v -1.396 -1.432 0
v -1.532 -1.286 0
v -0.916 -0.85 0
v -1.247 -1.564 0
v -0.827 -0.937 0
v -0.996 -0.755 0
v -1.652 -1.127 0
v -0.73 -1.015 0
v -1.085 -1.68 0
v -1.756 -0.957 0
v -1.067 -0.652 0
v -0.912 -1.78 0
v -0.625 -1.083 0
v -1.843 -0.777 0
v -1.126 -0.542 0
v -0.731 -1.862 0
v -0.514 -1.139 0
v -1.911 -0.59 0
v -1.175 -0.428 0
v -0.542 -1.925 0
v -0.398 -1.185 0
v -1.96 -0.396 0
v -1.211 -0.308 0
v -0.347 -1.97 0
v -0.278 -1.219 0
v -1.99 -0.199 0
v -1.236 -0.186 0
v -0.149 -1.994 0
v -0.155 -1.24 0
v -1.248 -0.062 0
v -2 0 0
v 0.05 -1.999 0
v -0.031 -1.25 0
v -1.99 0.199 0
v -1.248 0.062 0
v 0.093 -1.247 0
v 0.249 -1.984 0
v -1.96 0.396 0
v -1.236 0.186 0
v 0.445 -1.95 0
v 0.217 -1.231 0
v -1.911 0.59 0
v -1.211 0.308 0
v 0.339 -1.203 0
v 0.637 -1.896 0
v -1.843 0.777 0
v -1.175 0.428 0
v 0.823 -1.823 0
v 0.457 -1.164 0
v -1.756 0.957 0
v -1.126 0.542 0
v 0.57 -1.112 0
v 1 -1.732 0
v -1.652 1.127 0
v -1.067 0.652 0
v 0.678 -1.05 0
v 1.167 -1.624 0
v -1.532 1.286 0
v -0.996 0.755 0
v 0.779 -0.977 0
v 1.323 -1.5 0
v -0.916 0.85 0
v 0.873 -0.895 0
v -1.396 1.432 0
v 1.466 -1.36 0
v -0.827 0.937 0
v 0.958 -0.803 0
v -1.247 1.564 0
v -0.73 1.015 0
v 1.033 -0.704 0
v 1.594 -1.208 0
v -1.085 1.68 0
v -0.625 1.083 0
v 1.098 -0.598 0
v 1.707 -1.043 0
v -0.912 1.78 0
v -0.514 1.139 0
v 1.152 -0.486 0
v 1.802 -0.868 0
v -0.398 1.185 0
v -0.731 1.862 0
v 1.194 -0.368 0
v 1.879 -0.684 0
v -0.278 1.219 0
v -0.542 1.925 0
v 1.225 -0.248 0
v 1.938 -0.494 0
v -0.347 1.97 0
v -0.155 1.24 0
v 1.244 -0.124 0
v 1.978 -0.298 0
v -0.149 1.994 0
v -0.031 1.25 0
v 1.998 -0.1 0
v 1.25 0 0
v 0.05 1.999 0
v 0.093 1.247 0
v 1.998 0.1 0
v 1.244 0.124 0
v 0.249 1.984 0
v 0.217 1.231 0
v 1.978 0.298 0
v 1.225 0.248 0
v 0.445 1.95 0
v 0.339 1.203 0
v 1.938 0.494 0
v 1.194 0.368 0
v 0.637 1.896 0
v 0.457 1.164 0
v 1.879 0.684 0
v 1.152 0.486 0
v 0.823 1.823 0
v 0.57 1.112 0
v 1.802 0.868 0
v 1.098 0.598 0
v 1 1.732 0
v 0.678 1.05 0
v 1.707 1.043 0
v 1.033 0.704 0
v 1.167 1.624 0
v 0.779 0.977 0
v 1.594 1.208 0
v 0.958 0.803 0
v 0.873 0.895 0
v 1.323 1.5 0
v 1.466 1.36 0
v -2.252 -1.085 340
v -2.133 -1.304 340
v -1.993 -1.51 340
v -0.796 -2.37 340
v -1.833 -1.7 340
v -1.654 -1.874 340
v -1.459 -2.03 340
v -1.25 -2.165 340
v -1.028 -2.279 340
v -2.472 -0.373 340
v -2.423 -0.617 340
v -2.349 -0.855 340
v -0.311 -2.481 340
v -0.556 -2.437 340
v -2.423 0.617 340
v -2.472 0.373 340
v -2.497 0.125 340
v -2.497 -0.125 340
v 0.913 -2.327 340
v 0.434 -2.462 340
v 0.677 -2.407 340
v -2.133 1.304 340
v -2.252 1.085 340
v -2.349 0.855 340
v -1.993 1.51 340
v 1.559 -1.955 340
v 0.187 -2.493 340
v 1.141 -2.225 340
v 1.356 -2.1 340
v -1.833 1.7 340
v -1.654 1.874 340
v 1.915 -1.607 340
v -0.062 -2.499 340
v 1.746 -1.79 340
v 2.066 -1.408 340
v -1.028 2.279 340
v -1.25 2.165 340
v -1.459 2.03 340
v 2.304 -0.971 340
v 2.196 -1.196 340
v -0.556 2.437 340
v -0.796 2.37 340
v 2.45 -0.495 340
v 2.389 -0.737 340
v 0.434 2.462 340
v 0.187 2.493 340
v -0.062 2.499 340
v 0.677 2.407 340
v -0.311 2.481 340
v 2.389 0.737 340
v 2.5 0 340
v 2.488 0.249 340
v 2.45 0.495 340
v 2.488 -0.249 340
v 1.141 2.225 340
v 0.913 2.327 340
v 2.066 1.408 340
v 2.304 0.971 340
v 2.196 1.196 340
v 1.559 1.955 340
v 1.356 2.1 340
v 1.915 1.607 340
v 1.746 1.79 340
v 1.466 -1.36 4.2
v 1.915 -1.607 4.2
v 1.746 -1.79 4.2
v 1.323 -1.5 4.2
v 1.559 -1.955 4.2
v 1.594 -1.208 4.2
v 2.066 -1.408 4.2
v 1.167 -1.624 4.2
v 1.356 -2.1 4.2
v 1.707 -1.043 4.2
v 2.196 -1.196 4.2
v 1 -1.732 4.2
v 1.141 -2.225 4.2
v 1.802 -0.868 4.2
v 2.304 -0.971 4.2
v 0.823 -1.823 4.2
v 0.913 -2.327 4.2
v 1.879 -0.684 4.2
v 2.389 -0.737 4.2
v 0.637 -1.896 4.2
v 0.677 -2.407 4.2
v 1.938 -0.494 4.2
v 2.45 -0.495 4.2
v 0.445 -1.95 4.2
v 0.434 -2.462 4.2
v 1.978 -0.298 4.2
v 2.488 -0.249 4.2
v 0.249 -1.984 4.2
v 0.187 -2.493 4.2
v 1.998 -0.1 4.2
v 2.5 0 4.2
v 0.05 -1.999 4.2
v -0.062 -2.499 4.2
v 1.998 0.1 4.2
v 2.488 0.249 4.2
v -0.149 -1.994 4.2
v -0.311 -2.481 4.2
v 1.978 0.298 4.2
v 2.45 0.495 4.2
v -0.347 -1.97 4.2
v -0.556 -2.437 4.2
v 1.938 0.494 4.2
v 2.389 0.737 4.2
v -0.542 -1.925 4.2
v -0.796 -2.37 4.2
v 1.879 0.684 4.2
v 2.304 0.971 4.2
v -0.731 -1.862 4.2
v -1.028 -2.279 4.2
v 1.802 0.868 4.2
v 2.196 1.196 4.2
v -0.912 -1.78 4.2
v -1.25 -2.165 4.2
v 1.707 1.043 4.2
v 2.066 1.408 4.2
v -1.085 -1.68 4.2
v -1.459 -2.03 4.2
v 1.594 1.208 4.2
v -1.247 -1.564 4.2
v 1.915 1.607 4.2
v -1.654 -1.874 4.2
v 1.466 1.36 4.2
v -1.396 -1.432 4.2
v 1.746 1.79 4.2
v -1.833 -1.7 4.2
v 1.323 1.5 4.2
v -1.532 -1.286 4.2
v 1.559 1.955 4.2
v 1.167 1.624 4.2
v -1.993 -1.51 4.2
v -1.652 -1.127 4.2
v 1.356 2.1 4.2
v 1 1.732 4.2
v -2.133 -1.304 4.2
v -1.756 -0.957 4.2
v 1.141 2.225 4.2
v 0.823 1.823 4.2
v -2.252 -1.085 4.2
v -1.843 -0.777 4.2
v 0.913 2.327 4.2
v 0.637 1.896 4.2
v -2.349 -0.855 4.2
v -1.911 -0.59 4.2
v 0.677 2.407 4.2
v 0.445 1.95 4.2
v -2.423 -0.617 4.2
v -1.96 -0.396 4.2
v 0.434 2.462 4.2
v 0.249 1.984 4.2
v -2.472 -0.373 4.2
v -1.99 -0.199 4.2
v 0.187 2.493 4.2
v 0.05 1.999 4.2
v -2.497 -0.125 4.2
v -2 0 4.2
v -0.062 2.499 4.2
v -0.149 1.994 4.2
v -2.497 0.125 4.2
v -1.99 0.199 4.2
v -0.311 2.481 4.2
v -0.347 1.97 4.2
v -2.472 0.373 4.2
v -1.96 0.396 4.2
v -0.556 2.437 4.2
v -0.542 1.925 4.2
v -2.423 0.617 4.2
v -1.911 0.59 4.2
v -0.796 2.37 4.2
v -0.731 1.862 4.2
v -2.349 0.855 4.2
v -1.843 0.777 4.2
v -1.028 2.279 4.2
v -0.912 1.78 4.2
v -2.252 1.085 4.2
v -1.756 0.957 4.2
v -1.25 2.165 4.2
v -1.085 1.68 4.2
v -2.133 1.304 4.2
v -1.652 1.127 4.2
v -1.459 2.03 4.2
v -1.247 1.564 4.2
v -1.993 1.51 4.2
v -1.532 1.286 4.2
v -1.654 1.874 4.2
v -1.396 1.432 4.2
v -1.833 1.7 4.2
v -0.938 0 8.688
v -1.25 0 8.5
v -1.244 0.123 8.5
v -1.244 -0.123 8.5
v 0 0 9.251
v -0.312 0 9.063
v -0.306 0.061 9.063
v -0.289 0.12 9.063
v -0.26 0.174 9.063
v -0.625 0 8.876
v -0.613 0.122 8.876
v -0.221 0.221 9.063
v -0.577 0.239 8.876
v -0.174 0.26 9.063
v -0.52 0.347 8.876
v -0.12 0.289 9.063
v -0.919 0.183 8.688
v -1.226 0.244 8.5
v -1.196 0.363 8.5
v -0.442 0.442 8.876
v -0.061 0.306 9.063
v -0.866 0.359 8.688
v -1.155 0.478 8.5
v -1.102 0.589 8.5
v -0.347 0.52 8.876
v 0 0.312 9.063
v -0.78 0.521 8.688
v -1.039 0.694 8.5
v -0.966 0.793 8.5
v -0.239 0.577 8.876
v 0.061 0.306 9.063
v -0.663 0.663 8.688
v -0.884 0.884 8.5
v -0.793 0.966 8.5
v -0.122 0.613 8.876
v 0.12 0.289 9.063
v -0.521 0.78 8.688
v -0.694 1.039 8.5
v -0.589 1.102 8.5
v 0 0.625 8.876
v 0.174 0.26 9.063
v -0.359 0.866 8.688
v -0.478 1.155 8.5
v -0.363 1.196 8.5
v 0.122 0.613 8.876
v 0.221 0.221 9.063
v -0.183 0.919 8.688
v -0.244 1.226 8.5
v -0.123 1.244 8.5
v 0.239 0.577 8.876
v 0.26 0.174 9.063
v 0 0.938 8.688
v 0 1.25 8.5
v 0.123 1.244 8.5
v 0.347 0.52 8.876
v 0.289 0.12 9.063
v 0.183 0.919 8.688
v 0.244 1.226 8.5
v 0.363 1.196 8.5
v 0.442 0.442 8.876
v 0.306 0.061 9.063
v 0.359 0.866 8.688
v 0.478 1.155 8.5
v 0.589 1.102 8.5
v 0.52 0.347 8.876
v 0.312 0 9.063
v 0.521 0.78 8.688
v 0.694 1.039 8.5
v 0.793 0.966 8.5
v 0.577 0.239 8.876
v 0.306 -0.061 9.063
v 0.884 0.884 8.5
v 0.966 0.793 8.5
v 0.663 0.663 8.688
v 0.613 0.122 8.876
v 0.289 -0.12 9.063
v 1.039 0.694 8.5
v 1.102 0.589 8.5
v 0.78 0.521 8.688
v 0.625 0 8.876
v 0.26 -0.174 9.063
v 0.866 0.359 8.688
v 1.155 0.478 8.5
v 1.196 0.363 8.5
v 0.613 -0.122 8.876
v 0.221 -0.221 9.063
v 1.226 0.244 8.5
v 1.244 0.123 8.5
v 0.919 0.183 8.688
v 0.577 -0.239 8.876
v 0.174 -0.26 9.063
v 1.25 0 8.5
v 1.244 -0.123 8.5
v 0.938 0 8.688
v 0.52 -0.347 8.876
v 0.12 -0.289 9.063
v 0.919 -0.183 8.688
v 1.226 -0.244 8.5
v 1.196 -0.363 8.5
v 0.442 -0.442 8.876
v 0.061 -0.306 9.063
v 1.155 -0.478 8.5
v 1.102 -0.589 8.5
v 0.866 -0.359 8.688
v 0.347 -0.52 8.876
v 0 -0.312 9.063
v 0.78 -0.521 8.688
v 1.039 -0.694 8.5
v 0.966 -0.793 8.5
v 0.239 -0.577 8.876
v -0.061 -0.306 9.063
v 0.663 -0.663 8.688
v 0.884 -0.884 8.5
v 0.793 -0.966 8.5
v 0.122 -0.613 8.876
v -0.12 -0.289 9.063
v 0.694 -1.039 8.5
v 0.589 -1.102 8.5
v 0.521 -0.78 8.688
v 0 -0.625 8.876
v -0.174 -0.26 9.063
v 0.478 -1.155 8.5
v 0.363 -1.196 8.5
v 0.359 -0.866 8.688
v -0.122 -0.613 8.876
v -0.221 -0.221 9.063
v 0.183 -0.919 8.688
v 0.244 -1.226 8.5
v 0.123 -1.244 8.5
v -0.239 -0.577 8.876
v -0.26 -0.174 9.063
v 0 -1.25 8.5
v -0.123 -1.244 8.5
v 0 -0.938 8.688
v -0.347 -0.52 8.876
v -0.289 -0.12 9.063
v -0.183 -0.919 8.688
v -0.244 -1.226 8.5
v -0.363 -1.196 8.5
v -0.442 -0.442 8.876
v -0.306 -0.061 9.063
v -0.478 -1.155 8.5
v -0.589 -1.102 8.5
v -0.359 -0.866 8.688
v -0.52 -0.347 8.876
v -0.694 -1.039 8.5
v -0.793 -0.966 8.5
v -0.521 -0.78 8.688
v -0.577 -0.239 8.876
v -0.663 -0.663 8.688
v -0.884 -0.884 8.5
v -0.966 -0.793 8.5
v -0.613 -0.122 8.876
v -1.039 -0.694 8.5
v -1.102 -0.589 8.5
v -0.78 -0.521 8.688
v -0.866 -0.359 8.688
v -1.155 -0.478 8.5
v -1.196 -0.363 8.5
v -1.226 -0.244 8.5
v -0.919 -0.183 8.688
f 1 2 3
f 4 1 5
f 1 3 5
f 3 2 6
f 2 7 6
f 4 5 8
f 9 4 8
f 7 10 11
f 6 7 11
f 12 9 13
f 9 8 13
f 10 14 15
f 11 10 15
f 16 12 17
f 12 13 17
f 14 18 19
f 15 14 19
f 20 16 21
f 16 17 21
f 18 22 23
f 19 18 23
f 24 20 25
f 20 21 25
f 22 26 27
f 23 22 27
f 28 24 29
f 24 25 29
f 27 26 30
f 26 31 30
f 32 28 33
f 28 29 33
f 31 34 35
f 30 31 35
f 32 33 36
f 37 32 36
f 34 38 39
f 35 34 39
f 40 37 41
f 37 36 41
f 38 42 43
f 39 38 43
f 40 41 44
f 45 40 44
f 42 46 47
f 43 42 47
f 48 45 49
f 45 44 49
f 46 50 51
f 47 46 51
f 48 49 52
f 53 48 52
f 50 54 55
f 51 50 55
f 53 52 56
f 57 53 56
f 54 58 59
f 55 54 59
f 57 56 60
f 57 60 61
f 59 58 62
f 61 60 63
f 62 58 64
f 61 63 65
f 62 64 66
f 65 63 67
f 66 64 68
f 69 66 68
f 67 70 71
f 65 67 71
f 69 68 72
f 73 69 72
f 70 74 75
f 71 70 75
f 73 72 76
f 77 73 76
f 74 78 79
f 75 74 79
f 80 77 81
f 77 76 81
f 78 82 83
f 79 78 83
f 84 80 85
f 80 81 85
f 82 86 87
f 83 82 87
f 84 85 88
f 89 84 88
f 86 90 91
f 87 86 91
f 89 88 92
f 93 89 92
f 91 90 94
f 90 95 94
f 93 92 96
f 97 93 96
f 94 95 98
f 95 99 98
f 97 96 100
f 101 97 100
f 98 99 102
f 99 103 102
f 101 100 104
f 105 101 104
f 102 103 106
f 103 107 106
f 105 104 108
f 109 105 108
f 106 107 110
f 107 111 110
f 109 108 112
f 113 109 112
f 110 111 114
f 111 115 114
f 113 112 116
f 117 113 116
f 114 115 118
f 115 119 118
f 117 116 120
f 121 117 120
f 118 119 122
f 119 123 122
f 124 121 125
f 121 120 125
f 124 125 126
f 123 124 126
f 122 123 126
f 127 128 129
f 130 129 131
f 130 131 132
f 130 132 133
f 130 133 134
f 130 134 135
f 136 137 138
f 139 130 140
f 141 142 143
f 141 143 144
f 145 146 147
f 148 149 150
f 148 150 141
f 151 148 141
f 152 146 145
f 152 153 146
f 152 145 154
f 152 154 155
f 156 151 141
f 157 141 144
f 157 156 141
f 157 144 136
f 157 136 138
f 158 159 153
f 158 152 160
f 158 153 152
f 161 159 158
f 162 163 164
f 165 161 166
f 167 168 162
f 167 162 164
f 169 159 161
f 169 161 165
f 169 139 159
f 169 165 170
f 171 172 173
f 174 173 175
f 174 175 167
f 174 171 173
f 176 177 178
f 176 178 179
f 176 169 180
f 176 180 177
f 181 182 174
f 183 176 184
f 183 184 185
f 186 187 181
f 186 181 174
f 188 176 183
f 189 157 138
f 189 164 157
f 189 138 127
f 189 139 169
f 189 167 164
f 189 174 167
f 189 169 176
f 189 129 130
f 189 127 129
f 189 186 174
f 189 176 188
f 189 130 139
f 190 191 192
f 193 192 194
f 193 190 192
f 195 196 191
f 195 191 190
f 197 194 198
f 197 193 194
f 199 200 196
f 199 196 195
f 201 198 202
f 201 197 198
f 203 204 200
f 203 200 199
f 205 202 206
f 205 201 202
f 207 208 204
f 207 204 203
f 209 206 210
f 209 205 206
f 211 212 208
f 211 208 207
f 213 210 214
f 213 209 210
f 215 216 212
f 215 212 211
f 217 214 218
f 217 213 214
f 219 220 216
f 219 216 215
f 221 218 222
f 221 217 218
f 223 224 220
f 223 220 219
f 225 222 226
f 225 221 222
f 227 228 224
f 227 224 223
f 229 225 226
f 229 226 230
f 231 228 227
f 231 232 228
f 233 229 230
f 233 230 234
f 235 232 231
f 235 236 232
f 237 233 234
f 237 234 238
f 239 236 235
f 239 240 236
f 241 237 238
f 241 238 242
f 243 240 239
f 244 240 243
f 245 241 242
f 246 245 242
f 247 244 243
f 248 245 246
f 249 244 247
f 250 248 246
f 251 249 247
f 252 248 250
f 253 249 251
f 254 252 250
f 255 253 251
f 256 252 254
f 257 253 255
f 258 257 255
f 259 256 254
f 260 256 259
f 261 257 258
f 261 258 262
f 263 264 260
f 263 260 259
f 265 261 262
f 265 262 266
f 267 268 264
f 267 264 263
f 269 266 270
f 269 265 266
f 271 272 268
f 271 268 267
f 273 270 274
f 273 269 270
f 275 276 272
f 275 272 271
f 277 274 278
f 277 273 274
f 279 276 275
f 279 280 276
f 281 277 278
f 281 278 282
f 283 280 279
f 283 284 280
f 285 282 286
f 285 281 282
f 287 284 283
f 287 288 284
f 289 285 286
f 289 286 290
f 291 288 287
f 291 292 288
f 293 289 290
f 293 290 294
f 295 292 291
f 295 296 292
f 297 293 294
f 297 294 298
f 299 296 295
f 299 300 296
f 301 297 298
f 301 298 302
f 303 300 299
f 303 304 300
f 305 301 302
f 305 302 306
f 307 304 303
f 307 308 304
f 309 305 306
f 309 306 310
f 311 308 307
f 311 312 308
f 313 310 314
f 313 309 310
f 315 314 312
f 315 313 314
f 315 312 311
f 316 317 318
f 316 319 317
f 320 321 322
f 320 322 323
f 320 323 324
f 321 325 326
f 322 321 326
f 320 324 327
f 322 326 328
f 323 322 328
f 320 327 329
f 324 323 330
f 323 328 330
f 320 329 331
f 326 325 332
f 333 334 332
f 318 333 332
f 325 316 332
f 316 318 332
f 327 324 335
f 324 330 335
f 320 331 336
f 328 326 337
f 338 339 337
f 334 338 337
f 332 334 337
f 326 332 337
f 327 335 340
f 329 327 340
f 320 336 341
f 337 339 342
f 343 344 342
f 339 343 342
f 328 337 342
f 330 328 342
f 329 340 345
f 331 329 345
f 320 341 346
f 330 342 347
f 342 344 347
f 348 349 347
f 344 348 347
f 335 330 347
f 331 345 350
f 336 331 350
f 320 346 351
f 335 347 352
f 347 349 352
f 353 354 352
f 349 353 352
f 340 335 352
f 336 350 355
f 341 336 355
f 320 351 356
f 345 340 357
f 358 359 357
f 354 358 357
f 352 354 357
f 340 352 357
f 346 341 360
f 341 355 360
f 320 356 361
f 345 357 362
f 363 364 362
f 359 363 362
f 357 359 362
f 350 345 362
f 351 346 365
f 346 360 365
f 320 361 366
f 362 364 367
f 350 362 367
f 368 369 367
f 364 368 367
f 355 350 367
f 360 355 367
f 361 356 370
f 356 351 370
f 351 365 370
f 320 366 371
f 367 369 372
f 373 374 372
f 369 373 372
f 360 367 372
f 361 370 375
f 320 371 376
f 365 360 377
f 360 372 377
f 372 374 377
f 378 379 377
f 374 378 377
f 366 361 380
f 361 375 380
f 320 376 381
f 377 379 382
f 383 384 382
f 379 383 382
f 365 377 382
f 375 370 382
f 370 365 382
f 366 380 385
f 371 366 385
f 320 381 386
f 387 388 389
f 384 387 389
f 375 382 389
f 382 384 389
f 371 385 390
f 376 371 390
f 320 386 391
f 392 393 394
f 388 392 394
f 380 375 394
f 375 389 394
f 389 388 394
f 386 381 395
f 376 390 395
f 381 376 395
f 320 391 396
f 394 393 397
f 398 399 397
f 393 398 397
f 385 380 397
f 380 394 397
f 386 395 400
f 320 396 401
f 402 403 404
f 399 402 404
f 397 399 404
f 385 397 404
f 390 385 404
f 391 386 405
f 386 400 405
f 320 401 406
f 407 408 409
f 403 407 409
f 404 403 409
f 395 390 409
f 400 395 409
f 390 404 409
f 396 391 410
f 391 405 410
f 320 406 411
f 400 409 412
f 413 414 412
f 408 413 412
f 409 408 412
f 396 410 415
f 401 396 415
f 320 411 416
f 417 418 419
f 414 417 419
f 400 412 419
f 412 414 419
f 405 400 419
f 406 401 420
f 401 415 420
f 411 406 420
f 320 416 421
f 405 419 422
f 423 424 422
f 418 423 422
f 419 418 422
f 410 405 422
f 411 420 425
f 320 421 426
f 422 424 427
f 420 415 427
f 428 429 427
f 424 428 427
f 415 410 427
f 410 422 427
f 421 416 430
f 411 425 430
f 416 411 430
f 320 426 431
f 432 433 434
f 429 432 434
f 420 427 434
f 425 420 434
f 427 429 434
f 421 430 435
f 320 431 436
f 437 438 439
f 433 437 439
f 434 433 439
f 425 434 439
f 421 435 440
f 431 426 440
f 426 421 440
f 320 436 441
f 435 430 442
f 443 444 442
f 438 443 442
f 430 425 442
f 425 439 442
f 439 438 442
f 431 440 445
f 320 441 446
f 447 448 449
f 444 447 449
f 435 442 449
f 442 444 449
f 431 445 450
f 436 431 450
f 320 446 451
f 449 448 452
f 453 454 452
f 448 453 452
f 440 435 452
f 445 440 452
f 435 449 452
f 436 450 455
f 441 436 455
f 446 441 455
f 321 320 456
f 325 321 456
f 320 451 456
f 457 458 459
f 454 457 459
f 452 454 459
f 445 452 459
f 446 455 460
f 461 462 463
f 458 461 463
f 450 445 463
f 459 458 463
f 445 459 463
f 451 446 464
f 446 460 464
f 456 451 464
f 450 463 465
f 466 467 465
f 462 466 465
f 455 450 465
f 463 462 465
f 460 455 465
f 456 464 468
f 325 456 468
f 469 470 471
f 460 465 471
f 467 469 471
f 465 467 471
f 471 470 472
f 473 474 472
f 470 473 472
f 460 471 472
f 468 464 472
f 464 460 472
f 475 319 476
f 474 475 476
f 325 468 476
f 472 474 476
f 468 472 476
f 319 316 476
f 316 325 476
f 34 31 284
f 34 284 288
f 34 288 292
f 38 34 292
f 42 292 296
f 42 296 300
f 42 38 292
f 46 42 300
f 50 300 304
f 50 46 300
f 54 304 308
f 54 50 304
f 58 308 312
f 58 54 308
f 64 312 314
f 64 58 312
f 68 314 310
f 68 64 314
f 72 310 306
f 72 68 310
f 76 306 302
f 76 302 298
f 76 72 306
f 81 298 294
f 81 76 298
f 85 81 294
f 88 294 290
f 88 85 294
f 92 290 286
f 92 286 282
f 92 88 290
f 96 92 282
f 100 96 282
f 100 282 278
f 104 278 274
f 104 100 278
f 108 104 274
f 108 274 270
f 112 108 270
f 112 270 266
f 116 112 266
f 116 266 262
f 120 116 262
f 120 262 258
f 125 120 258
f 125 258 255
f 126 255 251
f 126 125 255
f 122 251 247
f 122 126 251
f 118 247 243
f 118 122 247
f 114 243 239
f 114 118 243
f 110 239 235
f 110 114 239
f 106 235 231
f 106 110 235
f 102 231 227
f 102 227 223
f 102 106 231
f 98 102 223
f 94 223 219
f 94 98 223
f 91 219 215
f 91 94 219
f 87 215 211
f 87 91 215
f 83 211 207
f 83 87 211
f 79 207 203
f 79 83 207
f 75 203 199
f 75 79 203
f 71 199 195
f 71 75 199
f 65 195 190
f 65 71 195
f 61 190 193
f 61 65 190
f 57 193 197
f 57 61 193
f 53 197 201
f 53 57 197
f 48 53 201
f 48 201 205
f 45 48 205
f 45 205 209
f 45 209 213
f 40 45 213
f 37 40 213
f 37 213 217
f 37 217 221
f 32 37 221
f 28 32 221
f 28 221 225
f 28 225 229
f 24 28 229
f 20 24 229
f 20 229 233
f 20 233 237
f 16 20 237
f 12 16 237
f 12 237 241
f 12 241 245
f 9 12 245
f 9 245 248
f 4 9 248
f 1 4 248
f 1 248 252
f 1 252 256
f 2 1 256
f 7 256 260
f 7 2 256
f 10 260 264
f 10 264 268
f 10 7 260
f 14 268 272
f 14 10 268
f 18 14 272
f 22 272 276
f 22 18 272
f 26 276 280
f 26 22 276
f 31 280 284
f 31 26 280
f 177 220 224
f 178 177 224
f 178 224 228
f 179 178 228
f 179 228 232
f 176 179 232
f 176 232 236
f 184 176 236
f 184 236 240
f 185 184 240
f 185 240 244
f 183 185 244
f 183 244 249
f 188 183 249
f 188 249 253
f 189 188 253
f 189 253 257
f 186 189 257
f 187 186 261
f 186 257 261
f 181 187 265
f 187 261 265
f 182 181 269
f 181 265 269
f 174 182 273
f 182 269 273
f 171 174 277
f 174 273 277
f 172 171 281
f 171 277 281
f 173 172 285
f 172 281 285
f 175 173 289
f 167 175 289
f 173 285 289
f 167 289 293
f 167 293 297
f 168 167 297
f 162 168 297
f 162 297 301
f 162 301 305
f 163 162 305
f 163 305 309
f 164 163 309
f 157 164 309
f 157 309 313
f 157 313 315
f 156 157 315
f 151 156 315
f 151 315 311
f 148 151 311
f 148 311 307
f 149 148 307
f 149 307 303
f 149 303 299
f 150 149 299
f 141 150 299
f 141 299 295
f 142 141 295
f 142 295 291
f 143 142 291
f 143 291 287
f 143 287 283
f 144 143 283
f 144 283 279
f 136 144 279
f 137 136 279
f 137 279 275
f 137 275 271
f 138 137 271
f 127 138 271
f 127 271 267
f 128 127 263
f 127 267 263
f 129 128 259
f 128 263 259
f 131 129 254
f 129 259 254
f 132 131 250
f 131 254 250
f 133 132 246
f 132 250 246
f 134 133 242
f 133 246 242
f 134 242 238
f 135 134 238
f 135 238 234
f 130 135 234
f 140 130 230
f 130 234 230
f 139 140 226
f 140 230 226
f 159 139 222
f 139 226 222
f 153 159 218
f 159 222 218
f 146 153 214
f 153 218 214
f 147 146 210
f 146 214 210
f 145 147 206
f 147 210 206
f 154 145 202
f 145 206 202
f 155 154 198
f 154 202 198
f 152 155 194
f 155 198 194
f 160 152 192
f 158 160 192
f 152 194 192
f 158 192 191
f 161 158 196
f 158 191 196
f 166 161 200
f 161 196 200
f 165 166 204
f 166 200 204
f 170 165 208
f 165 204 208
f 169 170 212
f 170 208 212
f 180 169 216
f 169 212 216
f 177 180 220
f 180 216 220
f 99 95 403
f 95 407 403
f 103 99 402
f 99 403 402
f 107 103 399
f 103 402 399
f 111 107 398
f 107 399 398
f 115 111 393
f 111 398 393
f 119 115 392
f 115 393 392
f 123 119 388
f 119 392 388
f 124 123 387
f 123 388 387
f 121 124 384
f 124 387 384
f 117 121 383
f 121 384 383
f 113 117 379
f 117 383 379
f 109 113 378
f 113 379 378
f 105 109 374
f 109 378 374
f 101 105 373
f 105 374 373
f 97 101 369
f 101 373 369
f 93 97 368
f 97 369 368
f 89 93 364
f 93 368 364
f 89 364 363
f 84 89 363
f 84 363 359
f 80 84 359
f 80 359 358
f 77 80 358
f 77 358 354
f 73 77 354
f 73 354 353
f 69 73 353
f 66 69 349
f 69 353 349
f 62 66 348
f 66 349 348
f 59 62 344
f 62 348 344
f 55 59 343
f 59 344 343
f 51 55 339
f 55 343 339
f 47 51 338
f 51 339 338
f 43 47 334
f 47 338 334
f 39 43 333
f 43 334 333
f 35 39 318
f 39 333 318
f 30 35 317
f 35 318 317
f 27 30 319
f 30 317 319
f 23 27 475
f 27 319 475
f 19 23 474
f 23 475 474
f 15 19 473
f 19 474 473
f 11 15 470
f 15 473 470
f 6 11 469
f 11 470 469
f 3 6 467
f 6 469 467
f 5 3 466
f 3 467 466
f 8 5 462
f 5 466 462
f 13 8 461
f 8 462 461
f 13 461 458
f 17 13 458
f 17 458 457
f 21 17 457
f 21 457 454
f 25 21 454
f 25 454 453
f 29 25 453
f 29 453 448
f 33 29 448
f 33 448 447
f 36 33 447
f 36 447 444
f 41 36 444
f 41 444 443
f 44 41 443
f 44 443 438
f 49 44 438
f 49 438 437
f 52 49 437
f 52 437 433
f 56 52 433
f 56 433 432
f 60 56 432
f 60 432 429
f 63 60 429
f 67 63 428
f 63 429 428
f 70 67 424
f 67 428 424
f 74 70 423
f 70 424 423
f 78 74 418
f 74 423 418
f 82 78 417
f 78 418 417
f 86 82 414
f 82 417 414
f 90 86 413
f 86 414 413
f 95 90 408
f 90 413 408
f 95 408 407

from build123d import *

# Parameters (mm, degrees)
ESQUISSE1_R               = 2.5
BOSS_EXTRU_1_DEPTH        = 340
ESQUISSE2_OUTSIDE_W       = 75.014
ESQUISSE2_OUTSIDE_H       = 75.014
ESQUISSE2_OUTSIDE_R       = 2
ENL_V_MAT_EXTRU_1_DEPTH   = 4.2
TROU_TARAUD_M3X0_51_D     = 2.5
TROU_TARAUD_M3X0_51_DEPTH = 8.5
TROU_TARAUD_M3X0_51_TIP   = 0.751075774


with BuildPart() as part:
    # Esquisse1 → Boss.-Extru.1 (new body)
    with BuildSketch(Plane.XY):
        Circle(ESQUISSE1_R)
    extrude(amount=BOSS_EXTRU_1_DEPTH)

    # Esquisse2 outside → Enlèv. mat.-Extru.1 (cut)
    with BuildSketch(Plane(origin=(0, 0, 0), x_dir=(-1, 0, 0), z_dir=(0, 0, -1))):
        Rectangle(ESQUISSE2_OUTSIDE_W, ESQUISSE2_OUTSIDE_H)
        Circle(ESQUISSE2_OUTSIDE_R, mode=Mode.SUBTRACT)
    extrude(amount=-ENL_V_MAT_EXTRU_1_DEPTH, mode=Mode.SUBTRACT)

    # Trou taraudé M3x0.51
    with Locations(Plane(origin=(0, 0, 0), x_dir=(-1, 0, 0), z_dir=(0, 0, -1))):
        with Locations((0, 0)):
            Hole(TROU_TARAUD_M3X0_51_D / 2, depth=TROU_TARAUD_M3X0_51_DEPTH)
            with Locations((0, 0, -(TROU_TARAUD_M3X0_51_DEPTH + TROU_TARAUD_M3X0_51_TIP / 2))):  # 118° drill point
                Cone(0, TROU_TARAUD_M3X0_51_D / 2, TROU_TARAUD_M3X0_51_TIP, mode=Mode.SUBTRACT)


solid = part.part
